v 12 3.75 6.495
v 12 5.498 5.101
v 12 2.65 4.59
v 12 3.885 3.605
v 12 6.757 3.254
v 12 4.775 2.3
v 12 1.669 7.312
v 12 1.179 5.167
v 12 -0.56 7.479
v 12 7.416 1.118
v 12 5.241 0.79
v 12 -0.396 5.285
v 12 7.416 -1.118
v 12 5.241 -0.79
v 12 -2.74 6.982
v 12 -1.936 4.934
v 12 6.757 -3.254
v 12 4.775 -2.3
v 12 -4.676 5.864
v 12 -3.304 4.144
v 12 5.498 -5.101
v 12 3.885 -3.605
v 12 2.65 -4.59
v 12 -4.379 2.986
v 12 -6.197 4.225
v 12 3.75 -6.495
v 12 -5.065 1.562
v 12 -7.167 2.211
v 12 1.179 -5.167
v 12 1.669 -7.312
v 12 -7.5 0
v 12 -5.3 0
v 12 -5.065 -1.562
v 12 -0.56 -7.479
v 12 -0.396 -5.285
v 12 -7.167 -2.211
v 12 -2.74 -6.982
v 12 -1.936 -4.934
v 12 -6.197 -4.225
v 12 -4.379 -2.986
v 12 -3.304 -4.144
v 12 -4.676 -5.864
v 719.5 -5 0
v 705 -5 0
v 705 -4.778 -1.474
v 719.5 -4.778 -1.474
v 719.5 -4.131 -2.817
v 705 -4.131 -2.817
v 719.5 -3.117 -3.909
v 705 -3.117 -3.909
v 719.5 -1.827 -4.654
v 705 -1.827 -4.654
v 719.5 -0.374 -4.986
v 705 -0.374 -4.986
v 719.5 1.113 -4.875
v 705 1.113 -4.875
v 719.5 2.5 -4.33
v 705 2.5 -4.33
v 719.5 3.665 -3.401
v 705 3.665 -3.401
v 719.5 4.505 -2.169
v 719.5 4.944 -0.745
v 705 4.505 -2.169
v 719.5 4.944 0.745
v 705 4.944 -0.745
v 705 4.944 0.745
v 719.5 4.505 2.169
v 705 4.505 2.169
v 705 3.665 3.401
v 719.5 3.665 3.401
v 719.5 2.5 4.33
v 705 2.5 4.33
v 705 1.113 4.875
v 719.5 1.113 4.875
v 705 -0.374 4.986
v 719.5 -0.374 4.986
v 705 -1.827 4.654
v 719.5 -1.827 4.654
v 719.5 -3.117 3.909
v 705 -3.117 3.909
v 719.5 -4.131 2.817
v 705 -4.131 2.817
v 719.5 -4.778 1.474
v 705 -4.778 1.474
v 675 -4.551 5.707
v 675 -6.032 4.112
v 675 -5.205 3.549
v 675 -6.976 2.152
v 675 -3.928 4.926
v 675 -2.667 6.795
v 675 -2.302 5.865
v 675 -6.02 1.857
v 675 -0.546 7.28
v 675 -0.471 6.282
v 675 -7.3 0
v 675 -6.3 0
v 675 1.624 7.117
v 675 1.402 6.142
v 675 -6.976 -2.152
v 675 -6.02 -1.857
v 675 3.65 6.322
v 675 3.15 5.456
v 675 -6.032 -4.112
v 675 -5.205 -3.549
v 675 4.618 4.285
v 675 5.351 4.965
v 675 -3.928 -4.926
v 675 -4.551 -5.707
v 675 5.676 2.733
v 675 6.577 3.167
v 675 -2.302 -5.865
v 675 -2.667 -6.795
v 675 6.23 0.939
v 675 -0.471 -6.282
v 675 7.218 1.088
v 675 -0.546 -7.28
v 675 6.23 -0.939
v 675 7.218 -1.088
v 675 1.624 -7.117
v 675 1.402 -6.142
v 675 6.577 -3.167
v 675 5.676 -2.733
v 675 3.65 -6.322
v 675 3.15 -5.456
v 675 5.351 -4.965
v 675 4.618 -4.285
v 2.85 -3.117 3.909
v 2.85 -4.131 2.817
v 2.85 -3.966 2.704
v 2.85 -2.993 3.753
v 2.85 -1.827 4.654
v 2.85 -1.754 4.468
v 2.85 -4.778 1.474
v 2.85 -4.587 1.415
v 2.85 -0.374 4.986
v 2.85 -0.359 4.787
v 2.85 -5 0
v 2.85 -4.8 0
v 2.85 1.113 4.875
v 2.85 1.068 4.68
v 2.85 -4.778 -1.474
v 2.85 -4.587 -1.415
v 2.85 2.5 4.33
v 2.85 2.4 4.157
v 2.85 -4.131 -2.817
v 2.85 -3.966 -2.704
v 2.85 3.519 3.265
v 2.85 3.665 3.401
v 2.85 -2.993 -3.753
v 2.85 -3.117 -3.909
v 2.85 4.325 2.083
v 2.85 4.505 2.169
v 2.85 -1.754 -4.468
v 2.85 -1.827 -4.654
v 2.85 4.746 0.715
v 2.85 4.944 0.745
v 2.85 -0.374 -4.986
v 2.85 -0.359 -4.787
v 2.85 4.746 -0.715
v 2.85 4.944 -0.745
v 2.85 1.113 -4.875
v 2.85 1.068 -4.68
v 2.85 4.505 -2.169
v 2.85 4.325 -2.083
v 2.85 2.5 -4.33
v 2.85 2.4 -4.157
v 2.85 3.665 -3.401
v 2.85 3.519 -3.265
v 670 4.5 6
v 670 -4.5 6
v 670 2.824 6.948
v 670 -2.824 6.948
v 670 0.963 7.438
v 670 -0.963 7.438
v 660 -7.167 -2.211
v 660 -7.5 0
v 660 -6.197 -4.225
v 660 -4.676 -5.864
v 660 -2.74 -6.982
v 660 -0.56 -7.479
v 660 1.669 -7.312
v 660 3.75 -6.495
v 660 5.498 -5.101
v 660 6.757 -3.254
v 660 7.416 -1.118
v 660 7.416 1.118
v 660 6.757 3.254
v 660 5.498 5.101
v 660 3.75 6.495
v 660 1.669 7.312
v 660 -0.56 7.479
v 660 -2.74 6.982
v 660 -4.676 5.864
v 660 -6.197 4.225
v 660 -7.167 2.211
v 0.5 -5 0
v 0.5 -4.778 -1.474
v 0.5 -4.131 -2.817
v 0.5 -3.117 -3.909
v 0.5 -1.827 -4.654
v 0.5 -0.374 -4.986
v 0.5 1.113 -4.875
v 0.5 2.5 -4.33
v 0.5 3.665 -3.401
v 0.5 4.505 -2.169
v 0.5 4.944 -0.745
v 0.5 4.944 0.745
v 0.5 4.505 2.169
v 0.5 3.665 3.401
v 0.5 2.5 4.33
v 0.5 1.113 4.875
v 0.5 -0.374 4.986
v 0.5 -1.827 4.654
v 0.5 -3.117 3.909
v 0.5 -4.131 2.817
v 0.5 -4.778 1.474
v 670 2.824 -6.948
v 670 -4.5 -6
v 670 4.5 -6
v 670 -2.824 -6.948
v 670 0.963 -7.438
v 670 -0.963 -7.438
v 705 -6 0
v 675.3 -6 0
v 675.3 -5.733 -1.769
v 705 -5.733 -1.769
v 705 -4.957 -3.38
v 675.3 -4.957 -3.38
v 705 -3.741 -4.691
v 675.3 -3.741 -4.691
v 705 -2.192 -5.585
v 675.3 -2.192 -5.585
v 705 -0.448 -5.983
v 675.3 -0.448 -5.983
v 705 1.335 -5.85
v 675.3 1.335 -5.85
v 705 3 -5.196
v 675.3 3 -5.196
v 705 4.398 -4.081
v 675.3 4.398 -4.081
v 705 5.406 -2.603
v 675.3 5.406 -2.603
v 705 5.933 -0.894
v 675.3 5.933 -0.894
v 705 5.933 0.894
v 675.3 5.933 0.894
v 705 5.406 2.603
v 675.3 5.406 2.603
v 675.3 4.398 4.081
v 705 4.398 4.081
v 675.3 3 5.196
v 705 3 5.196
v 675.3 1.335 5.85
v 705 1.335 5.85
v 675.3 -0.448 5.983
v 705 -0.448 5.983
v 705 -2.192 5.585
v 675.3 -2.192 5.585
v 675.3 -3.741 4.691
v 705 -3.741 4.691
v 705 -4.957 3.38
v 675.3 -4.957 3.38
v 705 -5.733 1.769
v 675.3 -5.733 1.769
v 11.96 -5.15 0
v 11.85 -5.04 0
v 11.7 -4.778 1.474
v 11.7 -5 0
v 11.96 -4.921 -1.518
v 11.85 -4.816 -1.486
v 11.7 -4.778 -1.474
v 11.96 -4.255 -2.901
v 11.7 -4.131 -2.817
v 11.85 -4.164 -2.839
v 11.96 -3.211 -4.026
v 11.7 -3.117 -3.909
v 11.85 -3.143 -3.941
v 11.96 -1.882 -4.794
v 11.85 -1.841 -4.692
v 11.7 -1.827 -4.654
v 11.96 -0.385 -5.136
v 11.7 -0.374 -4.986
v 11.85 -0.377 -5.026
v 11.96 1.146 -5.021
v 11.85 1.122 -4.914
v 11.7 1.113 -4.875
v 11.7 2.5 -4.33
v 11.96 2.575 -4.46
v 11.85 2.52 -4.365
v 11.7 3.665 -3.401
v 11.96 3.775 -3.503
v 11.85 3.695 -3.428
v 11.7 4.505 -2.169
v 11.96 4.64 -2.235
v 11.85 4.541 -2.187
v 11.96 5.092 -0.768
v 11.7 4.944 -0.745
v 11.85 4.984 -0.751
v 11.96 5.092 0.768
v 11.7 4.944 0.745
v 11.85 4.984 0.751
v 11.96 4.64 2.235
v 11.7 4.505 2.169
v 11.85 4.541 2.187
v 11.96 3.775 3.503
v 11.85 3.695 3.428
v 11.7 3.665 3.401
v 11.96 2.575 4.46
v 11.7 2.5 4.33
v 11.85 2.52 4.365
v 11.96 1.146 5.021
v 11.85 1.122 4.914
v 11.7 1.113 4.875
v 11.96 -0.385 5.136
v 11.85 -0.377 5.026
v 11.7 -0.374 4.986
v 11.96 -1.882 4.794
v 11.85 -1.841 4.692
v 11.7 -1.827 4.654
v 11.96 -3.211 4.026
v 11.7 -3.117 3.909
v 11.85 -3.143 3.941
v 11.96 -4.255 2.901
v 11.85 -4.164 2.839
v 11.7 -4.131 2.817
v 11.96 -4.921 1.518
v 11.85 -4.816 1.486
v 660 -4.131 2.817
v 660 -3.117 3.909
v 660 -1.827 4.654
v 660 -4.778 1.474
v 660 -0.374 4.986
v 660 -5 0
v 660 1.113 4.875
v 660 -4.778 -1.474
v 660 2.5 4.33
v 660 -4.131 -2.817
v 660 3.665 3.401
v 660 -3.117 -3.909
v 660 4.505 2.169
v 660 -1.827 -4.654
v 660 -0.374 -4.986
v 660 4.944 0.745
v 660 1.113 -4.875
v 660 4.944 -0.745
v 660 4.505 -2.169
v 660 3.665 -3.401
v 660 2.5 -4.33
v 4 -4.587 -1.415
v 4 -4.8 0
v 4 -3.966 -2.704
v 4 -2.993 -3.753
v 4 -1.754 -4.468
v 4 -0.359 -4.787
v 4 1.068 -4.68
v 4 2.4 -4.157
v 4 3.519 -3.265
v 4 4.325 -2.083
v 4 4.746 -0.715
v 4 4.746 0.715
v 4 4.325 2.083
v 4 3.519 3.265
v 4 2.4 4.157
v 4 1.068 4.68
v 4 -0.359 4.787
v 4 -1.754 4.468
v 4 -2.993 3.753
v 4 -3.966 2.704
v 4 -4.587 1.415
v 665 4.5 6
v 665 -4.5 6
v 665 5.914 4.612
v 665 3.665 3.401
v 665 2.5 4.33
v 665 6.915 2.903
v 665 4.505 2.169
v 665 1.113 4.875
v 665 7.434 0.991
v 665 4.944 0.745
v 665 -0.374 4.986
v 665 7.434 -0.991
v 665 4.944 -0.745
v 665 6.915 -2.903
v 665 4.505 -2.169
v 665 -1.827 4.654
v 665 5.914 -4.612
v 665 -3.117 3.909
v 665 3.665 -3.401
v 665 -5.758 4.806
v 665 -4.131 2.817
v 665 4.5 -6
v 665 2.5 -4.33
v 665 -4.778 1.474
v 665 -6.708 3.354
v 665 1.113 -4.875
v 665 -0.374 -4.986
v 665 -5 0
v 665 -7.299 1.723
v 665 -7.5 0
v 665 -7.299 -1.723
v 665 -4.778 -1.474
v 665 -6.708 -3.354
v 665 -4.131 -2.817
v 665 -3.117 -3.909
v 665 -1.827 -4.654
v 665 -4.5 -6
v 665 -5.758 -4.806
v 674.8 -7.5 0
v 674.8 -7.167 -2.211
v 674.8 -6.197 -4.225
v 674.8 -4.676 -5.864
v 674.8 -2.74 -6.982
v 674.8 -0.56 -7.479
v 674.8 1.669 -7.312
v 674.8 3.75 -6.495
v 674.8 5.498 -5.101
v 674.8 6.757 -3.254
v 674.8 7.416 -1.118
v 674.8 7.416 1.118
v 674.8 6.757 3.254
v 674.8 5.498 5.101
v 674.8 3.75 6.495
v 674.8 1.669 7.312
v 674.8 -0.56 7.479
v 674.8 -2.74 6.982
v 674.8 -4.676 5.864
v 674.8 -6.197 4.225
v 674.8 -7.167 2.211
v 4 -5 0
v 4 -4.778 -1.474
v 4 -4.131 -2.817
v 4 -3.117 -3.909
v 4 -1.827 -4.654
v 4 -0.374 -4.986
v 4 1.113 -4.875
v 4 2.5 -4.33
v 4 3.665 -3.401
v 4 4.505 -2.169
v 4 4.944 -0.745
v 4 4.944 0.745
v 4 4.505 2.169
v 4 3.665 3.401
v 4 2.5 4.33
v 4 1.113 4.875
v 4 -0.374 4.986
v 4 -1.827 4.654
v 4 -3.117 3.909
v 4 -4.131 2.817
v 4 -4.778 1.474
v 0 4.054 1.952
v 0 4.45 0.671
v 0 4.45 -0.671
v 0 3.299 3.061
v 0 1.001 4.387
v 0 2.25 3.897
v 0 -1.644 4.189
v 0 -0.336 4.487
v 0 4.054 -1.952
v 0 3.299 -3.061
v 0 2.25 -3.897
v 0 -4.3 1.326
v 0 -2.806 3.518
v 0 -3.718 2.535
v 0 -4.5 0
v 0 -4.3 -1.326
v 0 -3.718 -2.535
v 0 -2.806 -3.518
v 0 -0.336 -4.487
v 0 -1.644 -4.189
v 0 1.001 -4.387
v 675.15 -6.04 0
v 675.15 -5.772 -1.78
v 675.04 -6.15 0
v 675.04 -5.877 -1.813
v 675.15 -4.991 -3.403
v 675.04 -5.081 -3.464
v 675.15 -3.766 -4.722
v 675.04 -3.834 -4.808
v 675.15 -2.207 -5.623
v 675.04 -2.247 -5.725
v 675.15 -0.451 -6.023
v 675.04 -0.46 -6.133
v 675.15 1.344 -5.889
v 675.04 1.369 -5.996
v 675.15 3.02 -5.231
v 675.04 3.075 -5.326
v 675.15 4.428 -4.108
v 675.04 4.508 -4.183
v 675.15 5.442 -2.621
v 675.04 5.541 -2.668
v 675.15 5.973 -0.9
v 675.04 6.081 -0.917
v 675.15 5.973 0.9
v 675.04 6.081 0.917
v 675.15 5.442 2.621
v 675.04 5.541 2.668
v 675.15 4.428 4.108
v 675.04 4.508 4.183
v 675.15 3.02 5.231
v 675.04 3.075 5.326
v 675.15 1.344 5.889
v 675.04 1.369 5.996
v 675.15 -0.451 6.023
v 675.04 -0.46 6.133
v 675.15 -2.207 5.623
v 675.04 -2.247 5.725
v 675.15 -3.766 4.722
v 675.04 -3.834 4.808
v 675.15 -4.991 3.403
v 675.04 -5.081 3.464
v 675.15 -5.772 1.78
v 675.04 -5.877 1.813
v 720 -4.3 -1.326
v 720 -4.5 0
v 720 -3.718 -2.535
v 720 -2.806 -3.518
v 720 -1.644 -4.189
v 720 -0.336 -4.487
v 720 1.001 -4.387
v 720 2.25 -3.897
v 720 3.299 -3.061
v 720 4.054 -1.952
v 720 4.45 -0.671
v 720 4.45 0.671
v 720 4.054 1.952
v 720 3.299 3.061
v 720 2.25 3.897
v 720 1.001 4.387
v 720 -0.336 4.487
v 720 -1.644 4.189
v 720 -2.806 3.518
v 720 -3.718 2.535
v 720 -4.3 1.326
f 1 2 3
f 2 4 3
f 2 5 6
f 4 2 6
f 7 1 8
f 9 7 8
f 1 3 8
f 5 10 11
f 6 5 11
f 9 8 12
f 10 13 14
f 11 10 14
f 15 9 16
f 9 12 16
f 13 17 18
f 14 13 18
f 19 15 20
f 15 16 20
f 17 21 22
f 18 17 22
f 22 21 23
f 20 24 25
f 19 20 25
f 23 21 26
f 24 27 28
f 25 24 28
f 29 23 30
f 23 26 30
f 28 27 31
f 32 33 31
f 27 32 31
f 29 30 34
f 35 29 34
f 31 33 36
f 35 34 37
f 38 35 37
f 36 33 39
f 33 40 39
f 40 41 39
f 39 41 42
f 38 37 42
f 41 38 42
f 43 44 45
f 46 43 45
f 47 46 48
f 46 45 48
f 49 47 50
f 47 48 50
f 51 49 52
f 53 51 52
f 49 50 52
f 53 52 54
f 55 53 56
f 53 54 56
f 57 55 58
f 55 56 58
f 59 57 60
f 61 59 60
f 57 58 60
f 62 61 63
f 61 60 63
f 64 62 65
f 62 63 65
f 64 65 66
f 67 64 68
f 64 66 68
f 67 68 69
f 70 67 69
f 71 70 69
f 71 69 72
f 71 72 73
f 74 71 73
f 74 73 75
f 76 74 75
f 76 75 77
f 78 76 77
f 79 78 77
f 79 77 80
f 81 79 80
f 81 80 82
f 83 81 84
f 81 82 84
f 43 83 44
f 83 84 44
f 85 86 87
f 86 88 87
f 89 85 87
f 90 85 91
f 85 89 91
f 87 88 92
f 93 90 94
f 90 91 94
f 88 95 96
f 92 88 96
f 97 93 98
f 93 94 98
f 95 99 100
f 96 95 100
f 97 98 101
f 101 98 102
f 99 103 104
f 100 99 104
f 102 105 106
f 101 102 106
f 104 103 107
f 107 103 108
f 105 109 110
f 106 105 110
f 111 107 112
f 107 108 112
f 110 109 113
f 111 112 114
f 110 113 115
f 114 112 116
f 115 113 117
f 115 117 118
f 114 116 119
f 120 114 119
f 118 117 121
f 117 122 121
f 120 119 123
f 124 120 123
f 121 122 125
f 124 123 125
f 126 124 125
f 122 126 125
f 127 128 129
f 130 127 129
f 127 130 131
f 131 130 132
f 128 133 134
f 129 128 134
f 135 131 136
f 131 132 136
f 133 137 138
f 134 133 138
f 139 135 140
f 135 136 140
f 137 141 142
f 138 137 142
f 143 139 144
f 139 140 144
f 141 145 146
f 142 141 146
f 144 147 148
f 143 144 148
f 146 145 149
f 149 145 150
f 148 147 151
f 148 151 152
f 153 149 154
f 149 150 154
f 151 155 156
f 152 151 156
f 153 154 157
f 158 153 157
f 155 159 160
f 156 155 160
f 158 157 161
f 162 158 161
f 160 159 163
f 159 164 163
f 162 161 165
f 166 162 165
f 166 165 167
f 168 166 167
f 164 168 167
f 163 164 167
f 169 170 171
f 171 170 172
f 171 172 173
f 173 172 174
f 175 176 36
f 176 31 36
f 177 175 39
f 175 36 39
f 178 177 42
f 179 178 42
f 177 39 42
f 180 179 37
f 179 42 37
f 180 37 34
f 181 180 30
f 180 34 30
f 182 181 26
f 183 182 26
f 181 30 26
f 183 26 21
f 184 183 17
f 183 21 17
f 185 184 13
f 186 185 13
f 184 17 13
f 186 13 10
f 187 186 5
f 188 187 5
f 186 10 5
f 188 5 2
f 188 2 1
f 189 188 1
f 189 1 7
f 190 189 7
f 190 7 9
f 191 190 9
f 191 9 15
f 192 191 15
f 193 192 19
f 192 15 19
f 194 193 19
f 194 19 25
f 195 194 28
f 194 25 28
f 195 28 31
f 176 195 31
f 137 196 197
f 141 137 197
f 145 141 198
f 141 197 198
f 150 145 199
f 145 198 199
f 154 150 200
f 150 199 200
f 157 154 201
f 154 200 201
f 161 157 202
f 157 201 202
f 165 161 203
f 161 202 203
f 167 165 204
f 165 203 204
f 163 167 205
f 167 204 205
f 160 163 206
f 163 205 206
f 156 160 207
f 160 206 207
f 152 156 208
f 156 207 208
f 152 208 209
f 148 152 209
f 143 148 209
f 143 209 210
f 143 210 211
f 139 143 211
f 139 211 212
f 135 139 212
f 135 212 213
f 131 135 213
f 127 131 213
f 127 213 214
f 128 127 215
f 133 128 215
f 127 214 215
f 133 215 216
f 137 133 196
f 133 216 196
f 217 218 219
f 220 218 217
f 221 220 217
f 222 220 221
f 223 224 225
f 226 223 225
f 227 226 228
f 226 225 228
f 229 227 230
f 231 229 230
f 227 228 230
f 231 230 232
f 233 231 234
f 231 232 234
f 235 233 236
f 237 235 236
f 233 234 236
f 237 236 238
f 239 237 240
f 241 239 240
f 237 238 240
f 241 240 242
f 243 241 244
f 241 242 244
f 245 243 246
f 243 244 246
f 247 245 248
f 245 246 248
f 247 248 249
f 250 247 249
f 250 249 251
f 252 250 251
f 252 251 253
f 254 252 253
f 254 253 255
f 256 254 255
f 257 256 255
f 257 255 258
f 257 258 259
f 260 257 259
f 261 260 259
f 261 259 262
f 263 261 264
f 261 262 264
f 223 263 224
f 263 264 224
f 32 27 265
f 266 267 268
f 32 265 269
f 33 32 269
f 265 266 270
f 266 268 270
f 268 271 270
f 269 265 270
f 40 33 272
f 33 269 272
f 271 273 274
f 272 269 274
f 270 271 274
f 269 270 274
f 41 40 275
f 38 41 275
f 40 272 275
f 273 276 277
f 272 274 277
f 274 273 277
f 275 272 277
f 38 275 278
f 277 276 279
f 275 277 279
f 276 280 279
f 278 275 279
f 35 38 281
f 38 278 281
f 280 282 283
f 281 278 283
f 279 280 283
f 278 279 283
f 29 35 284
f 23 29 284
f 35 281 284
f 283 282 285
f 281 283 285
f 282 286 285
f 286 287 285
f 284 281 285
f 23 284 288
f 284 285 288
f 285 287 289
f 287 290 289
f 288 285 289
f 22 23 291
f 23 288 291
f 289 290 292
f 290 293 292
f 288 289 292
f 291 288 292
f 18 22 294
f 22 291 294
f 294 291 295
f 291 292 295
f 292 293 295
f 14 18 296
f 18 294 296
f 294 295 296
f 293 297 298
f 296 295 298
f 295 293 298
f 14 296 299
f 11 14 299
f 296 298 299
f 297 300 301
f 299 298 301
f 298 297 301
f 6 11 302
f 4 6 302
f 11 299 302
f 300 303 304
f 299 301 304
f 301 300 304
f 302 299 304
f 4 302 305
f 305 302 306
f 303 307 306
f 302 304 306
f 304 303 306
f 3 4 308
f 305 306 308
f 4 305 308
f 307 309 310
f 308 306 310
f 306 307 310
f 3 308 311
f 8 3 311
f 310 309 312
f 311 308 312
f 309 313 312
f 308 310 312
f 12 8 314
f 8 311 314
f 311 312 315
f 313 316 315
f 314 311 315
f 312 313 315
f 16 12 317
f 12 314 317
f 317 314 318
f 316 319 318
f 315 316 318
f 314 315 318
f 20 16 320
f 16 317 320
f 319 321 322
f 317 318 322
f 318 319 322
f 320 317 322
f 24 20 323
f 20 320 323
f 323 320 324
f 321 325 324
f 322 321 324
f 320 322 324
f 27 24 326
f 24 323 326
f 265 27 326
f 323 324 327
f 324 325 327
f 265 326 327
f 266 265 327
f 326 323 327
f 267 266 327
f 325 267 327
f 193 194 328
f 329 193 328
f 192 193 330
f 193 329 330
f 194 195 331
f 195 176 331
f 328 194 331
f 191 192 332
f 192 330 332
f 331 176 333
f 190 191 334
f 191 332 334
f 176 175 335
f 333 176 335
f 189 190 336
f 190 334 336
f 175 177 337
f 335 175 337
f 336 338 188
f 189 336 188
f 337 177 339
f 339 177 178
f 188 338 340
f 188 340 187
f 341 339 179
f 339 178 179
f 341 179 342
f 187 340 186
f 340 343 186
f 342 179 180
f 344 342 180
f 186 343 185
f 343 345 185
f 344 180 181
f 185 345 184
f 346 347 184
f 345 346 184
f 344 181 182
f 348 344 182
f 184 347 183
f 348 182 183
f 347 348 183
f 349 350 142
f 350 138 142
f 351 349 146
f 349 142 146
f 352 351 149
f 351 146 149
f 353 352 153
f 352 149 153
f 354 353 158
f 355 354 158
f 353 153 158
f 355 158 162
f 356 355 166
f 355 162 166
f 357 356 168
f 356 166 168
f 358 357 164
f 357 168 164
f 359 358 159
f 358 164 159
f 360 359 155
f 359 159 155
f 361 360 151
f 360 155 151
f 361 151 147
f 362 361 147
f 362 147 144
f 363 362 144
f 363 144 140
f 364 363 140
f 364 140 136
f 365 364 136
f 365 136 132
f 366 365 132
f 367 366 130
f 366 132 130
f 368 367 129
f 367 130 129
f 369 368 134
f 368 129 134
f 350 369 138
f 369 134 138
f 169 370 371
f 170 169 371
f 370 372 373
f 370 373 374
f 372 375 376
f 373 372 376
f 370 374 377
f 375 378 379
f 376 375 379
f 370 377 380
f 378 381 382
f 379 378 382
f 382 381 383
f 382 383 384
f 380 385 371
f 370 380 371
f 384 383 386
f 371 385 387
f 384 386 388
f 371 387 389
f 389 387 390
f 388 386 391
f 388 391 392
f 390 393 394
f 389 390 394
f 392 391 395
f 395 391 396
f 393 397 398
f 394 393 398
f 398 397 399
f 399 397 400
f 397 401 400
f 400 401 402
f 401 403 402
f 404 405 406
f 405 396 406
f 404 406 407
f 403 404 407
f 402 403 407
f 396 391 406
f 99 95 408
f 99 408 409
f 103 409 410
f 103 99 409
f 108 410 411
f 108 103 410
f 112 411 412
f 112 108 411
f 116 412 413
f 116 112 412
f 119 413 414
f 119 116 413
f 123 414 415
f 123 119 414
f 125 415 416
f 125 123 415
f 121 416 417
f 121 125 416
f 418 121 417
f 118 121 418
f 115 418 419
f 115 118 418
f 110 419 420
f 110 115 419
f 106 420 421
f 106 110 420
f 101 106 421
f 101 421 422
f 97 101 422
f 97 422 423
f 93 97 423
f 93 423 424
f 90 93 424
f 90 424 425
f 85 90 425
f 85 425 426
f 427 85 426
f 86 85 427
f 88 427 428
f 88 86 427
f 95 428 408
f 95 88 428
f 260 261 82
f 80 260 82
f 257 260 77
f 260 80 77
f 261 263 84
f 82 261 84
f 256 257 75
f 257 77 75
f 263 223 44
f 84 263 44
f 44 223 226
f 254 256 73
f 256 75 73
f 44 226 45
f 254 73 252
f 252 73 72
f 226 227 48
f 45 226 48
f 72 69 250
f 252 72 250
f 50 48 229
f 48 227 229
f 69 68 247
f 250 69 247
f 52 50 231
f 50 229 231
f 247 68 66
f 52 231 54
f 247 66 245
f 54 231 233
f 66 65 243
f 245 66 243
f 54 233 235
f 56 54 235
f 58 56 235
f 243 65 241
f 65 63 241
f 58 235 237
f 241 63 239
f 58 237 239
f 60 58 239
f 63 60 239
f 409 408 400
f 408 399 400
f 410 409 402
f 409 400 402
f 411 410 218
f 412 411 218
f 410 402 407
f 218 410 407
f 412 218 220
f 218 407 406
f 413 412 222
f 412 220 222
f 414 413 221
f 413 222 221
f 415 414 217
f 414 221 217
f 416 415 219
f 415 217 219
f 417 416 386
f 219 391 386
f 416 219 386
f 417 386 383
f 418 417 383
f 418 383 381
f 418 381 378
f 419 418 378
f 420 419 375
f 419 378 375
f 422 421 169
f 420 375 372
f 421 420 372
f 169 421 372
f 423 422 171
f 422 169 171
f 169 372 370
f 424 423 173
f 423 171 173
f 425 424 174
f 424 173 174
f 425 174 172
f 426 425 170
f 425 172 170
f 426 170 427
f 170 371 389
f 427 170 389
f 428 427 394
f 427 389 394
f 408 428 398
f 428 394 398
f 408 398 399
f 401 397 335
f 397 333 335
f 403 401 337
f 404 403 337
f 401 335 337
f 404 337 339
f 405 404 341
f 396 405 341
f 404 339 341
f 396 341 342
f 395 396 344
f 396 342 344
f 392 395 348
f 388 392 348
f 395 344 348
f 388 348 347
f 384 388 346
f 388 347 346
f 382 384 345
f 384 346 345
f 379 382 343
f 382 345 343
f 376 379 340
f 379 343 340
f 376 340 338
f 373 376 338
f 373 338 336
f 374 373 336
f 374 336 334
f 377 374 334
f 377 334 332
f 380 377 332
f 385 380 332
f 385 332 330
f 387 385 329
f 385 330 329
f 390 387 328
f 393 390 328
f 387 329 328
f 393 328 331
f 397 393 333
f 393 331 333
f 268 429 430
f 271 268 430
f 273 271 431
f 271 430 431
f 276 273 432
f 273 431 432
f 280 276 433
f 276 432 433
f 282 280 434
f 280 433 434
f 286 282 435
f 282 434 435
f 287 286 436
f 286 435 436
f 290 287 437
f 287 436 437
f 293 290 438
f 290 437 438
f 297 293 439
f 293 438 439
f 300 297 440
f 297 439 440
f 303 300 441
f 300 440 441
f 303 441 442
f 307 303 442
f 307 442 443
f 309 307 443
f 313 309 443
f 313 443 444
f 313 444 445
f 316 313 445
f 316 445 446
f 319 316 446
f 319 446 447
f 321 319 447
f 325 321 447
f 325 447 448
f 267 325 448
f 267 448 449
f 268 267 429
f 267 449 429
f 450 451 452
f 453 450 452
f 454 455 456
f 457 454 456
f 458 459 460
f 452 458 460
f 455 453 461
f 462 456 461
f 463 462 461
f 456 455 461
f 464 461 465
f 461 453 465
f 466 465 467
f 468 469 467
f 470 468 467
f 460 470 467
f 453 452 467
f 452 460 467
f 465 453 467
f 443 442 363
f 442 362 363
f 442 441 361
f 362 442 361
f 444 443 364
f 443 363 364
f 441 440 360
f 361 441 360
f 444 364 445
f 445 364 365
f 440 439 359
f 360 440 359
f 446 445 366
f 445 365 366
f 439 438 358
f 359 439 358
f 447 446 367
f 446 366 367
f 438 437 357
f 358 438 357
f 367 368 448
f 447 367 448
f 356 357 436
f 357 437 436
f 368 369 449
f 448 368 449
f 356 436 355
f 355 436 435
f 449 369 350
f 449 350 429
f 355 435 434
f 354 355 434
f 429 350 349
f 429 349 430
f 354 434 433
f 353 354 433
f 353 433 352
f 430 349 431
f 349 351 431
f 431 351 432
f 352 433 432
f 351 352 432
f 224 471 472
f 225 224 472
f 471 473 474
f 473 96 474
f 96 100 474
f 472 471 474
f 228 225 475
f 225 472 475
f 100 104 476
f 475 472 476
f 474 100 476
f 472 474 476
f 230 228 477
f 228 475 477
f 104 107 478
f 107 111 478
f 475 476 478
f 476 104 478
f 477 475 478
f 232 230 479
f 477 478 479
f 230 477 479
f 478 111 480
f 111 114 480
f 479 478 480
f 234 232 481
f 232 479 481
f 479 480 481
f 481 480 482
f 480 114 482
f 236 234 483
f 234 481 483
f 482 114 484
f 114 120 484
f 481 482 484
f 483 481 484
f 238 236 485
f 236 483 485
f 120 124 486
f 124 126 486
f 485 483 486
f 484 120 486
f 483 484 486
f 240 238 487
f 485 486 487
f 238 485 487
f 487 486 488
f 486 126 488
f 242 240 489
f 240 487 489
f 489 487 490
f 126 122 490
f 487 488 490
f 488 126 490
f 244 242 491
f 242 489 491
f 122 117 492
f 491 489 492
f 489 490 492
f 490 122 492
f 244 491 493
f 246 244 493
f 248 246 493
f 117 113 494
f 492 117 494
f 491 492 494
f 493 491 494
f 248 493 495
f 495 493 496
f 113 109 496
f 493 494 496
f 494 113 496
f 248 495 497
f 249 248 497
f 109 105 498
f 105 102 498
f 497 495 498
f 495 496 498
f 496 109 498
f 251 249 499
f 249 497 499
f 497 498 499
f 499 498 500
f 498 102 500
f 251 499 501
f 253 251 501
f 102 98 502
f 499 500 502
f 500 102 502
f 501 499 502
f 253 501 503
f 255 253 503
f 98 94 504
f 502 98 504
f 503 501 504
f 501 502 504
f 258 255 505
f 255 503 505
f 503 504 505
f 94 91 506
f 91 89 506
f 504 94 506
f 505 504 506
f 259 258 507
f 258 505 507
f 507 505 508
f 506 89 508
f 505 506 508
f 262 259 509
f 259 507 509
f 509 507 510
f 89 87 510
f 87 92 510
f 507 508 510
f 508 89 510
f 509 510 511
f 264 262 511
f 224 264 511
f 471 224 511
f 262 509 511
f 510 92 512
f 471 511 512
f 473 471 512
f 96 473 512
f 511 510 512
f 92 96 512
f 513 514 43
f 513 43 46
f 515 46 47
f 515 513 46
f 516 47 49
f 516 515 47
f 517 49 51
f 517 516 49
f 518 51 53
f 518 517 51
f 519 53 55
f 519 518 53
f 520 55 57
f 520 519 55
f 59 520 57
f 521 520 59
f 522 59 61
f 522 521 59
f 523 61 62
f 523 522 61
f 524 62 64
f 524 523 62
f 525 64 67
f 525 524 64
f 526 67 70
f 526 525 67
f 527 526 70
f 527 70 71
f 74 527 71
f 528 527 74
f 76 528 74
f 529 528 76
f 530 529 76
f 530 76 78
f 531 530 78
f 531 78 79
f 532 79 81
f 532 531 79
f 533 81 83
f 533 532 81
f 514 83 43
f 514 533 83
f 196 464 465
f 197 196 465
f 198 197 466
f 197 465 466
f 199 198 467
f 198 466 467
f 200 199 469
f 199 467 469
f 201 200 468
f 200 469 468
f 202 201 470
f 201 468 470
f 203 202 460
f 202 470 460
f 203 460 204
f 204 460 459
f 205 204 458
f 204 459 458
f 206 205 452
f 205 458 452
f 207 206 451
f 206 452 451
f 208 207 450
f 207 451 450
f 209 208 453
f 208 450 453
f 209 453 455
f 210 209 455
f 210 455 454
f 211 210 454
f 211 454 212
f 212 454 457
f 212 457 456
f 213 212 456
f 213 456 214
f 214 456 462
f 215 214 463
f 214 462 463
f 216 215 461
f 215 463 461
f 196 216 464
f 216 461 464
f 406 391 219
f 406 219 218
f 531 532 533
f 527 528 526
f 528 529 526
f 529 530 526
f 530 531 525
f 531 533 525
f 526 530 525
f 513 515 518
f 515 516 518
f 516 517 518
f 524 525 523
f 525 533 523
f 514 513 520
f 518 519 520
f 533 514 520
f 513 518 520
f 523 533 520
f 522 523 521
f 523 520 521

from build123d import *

# Parameters (mm, degrees)
FILLET1_R          = 0.3
CHAMFER1_SIZE      = 0.5
CHAMFER2_SIZE      = 0.2
CUT_EXTRUDE1_DEPTH = 5


with BuildPart() as part:
    # Sketch1 → Revolve1 (revolve)
    with BuildSketch(Plane.XY):
        Polygon((675, 7.5), (665, 7.5), (665, 5), (660, 5), (660, 7.5), (12, 7.5), (12, 5), (4, 5), (4, 4.8), (2.85, 4.8), (2.85, 5), (0, 5), (0, 0), (720, 0), (720, 5), (705, 5), (705, 6), (675, 6), align=None)
    revolve(axis=Axis((0, 0, 0), (1, 0, 0)))

    # Fillet1
    fillet1_edges = [part.edges().sort_by_distance(p)[0] for p in [
        (12, -5, 0),
        (675, -6, 0),
    ]]
    fillet(fillet1_edges, radius=FILLET1_R)

    # Chamfer1
    chamfer1_edges = [part.edges().sort_by_distance(p)[0] for p in [
        (720, -5, 0),
        (0, -5, 0),
    ]]
    chamfer(chamfer1_edges, length=CHAMFER1_SIZE)

    # Chamfer2
    chamfer2_edges = [part.edges().sort_by_distance(p)[0] for p in [
        (675, -7.5, 0),
    ]]
    chamfer(chamfer2_edges, length=CHAMFER2_SIZE)

    # Sketch2 → Cut-Extrude1 (cut)
    with BuildSketch(Plane.ZY.offset(-665)):
        with BuildLine():
            Line((-6, 4.5), (-6, -4.5))
            ThreePointArc((-6, -4.5), (-7.5, 0), (-6, 4.5))
        make_face()
        with BuildLine():
            Line((6, 4.5), (6, -4.5))
            ThreePointArc((6, -4.5), (7.5, 0), (6, 4.5))
        make_face()
    extrude(amount=-CUT_EXTRUDE1_DEPTH, mode=Mode.SUBTRACT)


solid = part.part
